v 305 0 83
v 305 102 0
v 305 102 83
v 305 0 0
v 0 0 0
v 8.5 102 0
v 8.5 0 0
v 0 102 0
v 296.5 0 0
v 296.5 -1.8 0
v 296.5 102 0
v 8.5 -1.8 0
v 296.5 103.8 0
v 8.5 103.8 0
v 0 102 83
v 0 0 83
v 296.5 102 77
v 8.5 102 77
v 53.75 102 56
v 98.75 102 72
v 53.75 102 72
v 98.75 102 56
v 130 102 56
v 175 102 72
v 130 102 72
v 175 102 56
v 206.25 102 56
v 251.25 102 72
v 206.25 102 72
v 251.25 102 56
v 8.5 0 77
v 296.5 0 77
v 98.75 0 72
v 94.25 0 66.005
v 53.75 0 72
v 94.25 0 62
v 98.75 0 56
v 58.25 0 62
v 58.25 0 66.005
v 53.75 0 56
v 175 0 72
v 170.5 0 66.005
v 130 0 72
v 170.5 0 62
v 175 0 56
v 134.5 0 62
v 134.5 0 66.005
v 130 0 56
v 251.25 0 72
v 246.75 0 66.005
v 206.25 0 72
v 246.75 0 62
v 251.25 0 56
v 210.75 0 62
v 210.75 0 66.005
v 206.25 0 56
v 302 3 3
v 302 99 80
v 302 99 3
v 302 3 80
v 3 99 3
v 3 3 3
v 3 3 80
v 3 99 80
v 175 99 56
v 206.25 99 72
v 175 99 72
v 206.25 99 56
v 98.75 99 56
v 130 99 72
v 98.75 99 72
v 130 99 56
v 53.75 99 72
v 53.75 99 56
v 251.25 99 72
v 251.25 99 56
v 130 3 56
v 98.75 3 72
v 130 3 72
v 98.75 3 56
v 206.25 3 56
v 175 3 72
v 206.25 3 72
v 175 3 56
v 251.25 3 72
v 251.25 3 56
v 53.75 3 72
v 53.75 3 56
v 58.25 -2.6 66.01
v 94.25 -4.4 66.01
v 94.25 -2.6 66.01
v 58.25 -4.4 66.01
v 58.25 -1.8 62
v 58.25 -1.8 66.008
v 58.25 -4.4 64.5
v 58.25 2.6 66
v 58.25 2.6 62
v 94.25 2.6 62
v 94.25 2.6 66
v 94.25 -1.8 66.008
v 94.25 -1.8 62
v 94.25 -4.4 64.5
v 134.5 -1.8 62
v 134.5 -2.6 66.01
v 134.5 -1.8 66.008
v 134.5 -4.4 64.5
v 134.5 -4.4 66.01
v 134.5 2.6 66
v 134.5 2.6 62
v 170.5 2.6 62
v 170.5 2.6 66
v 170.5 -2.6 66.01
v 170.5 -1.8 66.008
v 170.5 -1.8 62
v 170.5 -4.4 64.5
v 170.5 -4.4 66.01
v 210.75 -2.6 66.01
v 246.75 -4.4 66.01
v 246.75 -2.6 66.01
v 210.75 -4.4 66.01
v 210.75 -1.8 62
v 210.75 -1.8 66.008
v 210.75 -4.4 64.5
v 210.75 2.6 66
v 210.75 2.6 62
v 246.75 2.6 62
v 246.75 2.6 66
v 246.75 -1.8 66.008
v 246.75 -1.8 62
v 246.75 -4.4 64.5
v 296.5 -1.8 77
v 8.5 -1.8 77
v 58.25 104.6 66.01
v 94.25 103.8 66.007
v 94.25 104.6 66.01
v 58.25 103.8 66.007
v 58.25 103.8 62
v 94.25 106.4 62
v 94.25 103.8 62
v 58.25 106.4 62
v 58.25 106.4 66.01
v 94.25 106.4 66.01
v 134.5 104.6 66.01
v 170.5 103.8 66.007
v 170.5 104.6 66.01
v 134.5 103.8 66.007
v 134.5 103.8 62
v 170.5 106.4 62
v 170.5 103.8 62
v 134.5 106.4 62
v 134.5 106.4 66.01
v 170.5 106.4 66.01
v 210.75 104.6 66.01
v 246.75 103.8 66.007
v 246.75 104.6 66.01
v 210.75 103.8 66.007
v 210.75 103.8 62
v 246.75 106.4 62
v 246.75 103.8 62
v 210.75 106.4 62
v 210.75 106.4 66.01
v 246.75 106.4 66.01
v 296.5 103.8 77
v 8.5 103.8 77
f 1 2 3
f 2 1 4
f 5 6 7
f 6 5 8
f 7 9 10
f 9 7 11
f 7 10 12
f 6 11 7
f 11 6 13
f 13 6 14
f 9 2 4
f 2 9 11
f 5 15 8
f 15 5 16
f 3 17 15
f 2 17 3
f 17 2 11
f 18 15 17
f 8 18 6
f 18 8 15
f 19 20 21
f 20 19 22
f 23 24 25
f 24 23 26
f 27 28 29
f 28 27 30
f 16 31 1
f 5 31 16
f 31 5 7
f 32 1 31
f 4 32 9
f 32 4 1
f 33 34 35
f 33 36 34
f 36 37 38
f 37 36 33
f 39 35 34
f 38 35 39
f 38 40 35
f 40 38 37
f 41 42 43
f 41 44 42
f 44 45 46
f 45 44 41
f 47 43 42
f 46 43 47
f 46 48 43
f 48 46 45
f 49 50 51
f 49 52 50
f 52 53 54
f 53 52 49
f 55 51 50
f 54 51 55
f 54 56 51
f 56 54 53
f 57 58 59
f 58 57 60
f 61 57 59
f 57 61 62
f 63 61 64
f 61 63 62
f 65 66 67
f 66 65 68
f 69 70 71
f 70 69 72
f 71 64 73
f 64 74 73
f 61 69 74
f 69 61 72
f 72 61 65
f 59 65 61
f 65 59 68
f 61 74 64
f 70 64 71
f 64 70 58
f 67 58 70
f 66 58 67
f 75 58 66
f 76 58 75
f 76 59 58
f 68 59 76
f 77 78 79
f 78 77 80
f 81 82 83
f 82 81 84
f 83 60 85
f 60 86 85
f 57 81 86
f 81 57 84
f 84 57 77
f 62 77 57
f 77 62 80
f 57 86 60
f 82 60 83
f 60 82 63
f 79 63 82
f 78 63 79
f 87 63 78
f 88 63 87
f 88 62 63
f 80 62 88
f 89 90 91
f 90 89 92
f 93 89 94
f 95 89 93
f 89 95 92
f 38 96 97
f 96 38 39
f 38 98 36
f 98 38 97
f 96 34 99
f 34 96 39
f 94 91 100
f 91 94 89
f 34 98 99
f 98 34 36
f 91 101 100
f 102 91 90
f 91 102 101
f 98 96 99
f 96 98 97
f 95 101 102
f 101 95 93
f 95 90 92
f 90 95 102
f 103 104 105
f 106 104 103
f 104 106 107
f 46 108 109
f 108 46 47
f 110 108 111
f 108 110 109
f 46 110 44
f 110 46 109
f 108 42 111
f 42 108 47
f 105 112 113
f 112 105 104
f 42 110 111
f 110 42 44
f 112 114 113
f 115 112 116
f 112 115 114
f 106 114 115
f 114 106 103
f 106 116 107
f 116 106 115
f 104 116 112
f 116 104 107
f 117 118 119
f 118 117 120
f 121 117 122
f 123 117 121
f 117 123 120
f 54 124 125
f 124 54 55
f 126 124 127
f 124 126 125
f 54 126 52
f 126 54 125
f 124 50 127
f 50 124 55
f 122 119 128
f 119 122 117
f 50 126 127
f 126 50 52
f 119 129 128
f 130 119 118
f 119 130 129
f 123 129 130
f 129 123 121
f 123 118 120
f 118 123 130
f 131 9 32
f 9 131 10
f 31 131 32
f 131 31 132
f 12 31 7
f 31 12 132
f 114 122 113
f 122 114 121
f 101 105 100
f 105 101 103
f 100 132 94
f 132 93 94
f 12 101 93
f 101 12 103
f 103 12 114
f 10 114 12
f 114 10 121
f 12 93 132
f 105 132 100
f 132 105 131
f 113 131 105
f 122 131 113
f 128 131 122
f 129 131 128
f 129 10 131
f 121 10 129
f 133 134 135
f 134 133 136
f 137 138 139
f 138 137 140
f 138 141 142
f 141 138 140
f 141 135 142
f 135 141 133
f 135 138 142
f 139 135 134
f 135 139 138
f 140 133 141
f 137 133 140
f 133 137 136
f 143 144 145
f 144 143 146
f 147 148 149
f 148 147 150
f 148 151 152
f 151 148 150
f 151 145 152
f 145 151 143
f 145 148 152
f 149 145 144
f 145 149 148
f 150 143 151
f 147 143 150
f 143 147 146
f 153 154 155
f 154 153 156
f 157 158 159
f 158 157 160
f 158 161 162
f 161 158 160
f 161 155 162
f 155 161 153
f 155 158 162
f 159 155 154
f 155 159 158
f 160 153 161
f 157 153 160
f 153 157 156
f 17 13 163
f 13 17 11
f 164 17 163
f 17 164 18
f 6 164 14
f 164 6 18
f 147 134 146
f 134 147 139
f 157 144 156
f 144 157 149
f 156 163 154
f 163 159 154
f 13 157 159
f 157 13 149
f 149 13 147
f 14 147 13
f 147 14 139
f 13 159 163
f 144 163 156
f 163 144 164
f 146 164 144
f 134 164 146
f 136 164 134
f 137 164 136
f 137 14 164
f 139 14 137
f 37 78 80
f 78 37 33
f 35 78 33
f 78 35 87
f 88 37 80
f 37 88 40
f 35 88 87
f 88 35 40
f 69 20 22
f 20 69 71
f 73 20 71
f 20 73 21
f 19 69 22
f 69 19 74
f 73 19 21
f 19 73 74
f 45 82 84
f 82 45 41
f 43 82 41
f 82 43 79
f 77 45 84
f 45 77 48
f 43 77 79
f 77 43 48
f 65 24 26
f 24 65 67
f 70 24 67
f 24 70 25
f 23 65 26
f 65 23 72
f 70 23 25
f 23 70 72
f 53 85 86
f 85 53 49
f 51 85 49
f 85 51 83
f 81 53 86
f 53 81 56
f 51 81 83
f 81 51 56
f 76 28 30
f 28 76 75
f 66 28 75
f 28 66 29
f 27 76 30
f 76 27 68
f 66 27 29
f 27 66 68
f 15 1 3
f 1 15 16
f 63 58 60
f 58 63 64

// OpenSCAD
// 03_side_flap.scad
// RETROFIT ATTACHMENT — Version 3: Full-Height Side Flap with 3 Hooks
//
// NEW tray (z=0..50, blue) carries a thin full-length FLAP on each long side.
// The flap rises from the bottom of the new tray to just above the top-tray
// mid-point, carrying THREE hooks — one per window — that all snap inward
// simultaneously.  The flap is thin (1.8 mm) so it acts as a leaf spring:
// pressing outward at the middle releases all 3 hooks at once.
//
// TOP tray (z=50..83, grey) FIXED — ZERO geometry added.
//
// explode=0 engaged, explode=1 lifted apart.

explode = 0;

W    = 305;   D  = 102;   Hn = 50;   Ht = 33;   wall = 3;

win_w  = 45;   win_h = 16;   win_zc = 64;
function win_cx(i) = W * (i+1) / 4;

// Flap geometry
flap_t   = 1.8;    // flap thickness — thin for spring flex
flap_len = 288;    // flap length (X), centred, leaves 8.5 mm gap each end
flap_h   = Hn + Ht - 6;   // flap reaches z=77 (6 mm below top tray top)
hook_dep = 2.6;
hook_h   = 4.0;
hook_w   = 36;     // hook width (X) inside window
lead_in  = 1.5;
// hooks positioned at each window centre height
hook_zc  = win_zc;   // hook centred on window centre

expl = 45 * explode;

c_new  = [0.22, 0.55, 0.85, 1.00];
c_top  = [0.80, 0.80, 0.80, 0.80];
c_clip = [0.85, 0.18, 0.50, 1.00];   // magenta/pink

module top_tray() {
    color(c_top)
    translate([0, 0, Hn + expl])
    difference() {
        cube([W, D, Ht]);
        translate([wall, wall, -0.01])
            cube([W-2*wall, D-2*wall, Ht-wall+0.01]);
        for (i=[0:2]) {
            translate([win_cx(i)-win_w/2, -0.01, (win_zc-Hn)-win_h/2])
                cube([win_w, wall+0.02, win_h]);
            translate([win_cx(i)-win_w/2, D-wall-0.01, (win_zc-Hn)-win_h/2])
                cube([win_w, wall+0.02, win_h]);
        }
    }
}

module new_tray_body() {
    color(c_new)
    difference() {
        cube([W, D, Hn]);
        translate([wall, wall, wall])
            cube([W-2*wall, D-2*wall, Hn]);
    }
}

// Full-length flap with 3 hooks on one long side
module side_flap(side) {
    y0   = (side==0) ? -flap_t : D;
    inwd = (side==0) ? 1 : -1;
    x0   = (W - flap_len) / 2;

    color(c_clip) {
        // flap panel — from z=0 to z=flap_h
        translate([x0, y0, 0])
            cube([flap_len, flap_t, flap_h]);

        // 3 hooks, one per window
        for (i=[0:2]) {
            cx    = win_cx(i);
            hz    = hook_zc - hook_h/2;   // hook block bottom (absolute Z)
            translate([cx - hook_w/2, y0, hz])
            hull() {
                cube([hook_w, flap_t + hook_dep, hook_h]);
                translate([0, inwd*(-hook_dep), hook_h - lead_in])
                    cube([hook_w, flap_t, lead_in + 0.01]);
            }
        }
    }
}

// ASSEMBLY
new_tray_body();
side_flap(0);
side_flap(1);
top_tray();
